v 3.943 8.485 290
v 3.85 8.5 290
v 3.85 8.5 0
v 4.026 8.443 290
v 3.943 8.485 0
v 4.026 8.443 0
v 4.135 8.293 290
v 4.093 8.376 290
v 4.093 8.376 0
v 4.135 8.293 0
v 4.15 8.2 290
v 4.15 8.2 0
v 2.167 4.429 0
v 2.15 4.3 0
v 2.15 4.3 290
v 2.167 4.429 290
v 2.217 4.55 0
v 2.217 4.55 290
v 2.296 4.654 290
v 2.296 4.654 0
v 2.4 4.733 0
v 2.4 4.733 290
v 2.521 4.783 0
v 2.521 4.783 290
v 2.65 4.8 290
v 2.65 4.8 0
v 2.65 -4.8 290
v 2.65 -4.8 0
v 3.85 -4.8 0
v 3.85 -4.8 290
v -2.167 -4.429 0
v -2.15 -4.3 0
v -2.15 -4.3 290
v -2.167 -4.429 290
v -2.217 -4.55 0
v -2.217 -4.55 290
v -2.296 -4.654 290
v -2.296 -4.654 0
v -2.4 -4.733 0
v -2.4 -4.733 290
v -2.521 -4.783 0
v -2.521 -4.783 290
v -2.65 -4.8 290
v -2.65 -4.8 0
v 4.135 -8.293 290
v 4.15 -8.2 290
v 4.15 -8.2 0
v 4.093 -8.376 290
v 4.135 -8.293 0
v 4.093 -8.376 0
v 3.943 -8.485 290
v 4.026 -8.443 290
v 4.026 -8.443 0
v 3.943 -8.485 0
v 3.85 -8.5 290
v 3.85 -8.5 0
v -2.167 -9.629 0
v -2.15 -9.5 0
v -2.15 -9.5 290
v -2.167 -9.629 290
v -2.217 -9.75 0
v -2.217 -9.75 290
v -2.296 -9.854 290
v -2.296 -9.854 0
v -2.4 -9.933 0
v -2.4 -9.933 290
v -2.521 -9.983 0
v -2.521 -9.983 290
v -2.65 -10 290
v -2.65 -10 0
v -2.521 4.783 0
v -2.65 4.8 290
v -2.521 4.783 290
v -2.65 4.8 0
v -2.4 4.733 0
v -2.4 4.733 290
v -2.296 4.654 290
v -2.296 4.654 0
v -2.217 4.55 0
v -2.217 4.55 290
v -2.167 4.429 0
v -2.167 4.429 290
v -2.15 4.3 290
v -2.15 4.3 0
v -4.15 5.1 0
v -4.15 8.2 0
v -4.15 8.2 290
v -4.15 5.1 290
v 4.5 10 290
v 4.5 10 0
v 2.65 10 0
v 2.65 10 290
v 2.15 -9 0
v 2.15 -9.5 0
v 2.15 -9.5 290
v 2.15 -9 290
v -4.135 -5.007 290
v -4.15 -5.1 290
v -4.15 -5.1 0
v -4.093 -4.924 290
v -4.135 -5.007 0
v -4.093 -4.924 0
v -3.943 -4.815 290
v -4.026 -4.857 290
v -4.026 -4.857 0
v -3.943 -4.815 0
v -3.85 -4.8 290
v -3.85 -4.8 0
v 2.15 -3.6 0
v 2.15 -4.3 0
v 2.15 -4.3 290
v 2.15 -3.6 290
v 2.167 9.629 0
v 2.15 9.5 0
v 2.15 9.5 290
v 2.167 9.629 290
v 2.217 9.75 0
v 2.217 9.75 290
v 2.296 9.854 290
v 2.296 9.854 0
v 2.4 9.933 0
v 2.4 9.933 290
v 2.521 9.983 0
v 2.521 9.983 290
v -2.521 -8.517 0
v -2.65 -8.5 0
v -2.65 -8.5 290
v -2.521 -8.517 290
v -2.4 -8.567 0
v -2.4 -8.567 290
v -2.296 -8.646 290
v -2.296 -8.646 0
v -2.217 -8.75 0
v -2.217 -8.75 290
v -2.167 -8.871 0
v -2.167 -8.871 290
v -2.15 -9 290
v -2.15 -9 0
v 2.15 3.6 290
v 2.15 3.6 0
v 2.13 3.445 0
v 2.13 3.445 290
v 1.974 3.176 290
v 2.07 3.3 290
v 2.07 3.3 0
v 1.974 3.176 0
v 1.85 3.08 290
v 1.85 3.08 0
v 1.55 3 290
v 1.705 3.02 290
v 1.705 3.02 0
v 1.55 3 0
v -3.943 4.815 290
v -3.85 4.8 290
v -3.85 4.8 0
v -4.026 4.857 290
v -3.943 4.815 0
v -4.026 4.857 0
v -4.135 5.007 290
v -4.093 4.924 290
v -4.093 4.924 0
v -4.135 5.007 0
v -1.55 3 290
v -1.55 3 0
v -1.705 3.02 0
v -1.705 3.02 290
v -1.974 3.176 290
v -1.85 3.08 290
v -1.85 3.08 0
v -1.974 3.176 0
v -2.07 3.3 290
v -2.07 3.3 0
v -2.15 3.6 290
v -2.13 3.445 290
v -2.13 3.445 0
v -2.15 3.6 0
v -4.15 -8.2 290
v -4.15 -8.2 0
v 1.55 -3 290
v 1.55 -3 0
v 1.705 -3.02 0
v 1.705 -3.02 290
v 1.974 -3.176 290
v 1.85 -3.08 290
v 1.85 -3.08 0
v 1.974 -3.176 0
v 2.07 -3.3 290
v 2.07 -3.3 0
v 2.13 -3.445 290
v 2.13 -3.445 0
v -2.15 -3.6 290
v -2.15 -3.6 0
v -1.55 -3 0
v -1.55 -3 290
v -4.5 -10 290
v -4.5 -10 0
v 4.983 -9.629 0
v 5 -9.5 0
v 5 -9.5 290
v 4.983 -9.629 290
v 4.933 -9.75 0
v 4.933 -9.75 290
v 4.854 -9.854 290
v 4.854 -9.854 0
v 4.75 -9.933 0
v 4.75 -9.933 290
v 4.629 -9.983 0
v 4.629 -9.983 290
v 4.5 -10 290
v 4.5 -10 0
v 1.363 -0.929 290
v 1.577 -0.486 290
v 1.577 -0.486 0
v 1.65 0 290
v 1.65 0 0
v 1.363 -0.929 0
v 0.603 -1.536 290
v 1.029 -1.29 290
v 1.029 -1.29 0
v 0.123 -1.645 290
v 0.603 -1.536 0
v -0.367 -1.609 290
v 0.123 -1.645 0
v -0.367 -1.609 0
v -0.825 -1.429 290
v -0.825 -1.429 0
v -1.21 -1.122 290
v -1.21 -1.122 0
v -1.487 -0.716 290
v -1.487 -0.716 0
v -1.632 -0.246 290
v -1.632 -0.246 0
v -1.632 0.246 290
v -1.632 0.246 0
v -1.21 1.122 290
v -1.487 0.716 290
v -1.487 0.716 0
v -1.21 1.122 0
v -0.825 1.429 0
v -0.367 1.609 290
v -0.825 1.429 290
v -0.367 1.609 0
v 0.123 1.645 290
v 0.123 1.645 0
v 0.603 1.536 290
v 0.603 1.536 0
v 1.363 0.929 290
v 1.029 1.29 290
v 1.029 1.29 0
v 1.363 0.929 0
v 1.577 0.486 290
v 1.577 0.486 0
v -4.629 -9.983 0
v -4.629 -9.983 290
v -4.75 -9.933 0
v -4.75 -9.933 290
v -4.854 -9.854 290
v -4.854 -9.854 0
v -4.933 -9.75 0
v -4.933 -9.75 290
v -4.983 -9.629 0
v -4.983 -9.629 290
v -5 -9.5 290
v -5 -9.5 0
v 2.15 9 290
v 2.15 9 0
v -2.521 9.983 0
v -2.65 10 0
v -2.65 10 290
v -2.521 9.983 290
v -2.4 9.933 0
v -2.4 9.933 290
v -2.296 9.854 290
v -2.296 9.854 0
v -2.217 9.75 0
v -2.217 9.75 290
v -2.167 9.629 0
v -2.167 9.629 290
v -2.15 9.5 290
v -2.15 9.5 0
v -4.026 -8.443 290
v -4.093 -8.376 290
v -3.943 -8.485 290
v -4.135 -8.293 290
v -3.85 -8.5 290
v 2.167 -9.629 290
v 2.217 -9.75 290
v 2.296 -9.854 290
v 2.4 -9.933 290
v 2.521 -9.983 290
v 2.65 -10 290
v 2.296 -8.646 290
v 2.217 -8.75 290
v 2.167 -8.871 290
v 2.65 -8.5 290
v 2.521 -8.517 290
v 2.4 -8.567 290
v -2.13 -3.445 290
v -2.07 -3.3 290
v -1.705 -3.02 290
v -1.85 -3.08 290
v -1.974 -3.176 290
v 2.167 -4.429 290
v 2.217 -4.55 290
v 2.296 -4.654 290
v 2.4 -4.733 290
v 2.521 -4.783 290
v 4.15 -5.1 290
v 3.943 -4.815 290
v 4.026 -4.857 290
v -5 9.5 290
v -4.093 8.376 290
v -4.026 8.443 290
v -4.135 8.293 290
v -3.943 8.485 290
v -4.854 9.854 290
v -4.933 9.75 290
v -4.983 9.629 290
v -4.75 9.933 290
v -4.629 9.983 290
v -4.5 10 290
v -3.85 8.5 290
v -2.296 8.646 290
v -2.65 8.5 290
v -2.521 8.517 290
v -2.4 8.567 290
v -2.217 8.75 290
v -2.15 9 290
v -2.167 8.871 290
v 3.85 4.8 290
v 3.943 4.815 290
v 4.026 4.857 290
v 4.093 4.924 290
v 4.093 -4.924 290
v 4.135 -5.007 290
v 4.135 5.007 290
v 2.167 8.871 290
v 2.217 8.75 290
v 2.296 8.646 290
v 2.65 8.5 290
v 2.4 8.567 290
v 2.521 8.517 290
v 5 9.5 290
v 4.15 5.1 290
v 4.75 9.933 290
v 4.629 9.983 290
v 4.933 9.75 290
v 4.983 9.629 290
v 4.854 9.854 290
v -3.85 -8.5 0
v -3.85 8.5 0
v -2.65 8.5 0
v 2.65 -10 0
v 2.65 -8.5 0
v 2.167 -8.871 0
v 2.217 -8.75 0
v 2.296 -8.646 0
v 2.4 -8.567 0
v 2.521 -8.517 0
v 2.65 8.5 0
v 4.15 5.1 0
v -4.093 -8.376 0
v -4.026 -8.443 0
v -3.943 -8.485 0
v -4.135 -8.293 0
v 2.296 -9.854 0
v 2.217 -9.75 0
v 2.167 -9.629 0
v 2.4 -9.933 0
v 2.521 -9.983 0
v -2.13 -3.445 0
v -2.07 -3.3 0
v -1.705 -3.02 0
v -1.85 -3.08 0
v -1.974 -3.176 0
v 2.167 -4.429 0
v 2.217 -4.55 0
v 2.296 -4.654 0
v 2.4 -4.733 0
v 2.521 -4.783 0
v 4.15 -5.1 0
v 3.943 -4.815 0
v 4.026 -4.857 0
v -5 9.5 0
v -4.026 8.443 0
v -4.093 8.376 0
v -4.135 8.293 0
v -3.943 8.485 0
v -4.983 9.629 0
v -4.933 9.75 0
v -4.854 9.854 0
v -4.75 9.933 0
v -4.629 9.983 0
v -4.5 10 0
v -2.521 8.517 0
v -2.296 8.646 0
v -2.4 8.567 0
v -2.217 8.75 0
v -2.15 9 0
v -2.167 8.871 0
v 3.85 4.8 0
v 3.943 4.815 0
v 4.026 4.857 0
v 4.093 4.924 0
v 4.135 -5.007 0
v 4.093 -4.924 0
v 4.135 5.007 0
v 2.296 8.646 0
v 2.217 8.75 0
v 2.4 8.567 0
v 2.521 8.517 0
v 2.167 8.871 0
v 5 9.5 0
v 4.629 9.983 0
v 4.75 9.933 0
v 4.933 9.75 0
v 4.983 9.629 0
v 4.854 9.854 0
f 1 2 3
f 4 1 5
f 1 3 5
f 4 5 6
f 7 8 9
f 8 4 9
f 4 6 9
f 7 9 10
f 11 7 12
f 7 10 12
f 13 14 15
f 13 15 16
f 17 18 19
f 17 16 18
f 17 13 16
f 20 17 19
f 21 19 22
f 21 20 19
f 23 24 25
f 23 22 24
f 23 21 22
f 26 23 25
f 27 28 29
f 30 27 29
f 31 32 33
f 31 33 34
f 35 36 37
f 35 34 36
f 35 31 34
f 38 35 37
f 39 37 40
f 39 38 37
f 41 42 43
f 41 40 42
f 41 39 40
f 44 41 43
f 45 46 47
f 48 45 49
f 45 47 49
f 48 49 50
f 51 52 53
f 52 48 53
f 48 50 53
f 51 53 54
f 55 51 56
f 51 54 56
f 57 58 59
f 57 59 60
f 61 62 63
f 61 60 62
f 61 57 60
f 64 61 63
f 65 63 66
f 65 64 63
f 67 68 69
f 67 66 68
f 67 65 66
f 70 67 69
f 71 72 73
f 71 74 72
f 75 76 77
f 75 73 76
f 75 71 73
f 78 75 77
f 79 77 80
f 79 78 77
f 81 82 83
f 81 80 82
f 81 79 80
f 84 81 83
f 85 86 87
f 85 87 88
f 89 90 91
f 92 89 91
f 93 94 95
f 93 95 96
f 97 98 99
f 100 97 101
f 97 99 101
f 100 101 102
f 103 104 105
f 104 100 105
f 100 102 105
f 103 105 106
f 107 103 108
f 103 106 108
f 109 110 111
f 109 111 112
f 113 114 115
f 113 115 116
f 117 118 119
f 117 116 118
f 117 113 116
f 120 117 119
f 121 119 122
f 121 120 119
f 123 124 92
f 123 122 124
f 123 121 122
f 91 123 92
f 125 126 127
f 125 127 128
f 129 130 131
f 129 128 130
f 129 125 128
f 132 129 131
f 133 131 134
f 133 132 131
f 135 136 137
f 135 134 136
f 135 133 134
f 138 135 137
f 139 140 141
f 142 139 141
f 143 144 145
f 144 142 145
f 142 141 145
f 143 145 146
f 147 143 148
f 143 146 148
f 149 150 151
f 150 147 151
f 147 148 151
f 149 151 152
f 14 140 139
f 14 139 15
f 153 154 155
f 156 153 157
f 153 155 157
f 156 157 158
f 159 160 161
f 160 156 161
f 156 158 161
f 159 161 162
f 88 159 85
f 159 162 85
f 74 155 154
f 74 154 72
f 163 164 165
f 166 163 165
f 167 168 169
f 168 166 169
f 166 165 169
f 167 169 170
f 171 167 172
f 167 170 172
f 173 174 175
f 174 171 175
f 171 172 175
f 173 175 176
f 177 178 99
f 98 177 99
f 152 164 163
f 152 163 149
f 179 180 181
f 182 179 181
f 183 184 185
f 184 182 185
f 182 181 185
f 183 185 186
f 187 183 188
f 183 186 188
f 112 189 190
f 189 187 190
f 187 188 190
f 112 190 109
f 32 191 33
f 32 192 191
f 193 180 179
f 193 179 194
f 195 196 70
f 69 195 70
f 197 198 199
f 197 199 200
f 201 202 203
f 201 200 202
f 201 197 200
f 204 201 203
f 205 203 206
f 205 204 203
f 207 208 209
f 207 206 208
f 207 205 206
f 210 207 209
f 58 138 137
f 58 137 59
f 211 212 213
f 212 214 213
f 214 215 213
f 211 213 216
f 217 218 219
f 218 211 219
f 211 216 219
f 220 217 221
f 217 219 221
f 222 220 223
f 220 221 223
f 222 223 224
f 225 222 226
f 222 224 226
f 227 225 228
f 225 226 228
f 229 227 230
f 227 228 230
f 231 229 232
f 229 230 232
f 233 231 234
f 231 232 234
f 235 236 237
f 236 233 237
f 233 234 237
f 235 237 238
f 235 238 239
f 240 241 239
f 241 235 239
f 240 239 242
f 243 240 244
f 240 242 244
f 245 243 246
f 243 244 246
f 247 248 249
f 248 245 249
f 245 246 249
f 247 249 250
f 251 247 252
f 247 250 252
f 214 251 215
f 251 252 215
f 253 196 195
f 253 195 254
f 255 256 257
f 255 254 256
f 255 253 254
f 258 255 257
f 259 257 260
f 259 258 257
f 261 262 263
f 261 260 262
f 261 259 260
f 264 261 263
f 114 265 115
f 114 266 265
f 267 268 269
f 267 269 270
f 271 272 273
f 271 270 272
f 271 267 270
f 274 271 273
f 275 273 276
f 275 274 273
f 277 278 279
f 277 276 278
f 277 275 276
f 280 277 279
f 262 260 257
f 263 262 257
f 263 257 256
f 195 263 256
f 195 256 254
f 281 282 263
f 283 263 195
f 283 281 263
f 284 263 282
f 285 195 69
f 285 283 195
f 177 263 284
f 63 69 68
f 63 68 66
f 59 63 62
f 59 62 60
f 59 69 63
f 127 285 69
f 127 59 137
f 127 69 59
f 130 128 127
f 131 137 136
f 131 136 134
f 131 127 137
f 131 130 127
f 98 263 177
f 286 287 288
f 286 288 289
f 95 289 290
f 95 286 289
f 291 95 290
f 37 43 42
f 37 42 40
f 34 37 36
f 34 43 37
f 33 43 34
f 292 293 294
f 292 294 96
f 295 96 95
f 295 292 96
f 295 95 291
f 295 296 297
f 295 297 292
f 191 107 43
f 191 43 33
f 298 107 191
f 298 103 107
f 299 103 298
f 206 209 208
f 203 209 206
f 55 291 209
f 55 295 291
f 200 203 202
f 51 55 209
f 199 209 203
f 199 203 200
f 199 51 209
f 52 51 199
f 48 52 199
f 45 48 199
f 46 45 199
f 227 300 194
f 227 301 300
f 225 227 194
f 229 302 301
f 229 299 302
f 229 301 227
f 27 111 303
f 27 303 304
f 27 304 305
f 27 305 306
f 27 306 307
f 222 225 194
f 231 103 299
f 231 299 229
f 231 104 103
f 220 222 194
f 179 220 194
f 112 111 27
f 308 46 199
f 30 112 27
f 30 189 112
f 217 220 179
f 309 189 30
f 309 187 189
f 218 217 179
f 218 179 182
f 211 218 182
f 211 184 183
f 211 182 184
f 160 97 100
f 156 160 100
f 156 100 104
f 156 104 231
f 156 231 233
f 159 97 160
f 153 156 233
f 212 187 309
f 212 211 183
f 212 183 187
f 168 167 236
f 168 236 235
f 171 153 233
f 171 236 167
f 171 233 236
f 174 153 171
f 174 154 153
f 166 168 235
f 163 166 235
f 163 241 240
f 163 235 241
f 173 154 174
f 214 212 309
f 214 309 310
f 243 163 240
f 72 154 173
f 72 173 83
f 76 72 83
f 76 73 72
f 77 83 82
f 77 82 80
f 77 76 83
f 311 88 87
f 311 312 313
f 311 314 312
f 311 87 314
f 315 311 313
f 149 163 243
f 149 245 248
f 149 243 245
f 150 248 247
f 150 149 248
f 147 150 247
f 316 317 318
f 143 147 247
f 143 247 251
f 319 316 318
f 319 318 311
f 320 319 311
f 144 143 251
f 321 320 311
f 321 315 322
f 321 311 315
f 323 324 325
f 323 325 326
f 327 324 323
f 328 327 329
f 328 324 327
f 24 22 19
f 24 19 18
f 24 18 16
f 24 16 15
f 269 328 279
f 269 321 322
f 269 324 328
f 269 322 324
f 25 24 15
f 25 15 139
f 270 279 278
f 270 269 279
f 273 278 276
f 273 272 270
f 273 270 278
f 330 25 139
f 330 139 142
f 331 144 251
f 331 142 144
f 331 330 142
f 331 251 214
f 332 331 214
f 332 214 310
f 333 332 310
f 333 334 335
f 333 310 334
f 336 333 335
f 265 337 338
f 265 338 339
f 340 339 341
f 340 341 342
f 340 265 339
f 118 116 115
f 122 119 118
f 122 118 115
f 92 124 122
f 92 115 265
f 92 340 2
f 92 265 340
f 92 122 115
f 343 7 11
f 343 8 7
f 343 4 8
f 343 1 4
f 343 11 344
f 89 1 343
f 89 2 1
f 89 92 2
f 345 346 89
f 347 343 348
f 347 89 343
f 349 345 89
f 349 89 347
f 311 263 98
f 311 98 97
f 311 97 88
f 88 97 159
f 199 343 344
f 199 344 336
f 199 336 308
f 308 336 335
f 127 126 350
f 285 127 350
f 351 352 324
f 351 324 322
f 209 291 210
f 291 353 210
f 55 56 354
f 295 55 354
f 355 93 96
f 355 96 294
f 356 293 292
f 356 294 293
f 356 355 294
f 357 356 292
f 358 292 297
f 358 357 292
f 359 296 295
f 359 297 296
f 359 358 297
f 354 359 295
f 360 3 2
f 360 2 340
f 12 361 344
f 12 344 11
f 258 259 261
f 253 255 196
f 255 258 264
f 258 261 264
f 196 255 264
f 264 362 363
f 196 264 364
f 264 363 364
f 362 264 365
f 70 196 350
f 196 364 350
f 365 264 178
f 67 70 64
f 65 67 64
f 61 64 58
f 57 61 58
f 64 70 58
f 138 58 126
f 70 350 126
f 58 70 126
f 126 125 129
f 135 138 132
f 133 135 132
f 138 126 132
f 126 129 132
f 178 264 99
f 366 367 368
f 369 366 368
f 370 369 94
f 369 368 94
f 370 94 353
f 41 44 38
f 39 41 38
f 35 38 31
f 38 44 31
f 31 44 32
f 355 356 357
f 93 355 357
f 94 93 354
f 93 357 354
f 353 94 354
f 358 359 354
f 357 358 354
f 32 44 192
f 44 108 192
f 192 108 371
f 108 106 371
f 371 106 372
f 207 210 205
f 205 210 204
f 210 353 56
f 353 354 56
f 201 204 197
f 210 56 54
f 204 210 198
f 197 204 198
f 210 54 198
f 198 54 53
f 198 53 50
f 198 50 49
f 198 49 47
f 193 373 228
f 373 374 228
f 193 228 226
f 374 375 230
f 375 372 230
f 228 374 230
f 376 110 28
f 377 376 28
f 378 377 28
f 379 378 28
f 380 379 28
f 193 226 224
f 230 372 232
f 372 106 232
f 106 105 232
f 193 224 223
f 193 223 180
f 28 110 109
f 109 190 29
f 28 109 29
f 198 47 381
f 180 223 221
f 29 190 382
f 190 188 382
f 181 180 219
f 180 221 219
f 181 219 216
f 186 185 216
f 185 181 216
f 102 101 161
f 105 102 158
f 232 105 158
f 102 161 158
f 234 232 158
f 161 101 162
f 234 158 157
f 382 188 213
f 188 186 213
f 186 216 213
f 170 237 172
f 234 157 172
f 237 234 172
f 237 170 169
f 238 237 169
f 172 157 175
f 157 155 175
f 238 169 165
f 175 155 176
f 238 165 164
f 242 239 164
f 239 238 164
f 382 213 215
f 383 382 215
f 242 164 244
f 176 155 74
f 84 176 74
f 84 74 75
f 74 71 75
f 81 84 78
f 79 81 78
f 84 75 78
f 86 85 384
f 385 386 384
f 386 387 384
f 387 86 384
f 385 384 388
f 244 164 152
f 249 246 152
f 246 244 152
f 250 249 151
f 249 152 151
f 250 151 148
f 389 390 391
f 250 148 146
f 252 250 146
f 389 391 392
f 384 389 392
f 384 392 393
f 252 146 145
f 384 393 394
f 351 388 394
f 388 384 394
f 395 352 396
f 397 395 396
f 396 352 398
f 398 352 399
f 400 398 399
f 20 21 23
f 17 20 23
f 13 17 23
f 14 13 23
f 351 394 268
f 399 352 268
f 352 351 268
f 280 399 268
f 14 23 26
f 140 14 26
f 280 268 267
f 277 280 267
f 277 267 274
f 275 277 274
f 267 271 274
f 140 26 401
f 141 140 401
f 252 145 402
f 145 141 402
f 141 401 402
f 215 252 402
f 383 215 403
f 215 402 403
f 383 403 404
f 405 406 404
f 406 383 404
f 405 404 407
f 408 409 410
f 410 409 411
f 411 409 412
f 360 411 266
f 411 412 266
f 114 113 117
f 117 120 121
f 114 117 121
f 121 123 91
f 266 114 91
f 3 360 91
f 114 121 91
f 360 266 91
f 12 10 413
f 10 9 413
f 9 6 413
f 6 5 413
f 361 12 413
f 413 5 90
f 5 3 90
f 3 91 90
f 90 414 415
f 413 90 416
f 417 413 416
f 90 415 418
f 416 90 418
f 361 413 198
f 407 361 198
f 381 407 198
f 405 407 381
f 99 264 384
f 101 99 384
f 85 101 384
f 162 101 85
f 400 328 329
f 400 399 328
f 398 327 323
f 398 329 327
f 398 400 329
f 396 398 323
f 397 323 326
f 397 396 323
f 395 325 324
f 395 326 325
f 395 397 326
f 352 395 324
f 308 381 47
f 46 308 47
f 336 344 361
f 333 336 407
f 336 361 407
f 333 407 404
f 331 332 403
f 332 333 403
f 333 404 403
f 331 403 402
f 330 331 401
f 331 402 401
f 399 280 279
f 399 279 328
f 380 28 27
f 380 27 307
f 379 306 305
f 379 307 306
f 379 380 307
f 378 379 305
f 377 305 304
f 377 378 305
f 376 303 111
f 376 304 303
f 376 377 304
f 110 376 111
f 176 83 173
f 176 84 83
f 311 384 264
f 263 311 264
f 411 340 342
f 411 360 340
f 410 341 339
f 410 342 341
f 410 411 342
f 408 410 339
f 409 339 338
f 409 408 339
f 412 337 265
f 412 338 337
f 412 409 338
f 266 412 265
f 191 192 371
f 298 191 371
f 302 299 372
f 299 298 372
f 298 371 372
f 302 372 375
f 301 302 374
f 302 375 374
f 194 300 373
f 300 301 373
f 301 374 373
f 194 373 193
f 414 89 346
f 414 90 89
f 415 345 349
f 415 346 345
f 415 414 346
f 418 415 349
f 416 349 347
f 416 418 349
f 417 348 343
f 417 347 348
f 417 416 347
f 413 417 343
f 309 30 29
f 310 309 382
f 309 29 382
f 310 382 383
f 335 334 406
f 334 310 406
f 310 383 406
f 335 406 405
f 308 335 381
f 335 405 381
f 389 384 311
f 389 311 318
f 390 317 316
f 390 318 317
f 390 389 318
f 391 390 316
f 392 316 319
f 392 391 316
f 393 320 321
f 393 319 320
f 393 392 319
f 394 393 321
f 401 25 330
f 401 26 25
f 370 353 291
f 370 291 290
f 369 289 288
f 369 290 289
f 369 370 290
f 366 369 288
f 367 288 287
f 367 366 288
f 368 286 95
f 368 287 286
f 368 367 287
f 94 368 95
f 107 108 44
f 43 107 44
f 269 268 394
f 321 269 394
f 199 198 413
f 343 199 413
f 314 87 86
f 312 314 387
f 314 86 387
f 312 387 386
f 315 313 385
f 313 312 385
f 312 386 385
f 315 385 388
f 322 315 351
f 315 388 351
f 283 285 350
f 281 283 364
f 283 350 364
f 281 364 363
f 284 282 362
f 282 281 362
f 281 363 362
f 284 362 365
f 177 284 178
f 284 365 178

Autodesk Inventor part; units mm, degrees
ref_plane "YZ Plane" through (0, 0, 0) normal (1, 0, 0) x (0, 1, 0)
ref_plane "XZ Plane" through (0, 0, 0) normal (0, 1, 0) x (-1, 0, 0)
ref_plane "XY Plane" through (0, 0, 0) normal (0, 0, 1) x (1, 0, 0)
sketch "BaseI" plane through (0, 0, 0) normal (0, 0, 1) x (1, 0, 0)
  line L0 (-4.5, -10) -> (-2.65, -10)
  line L1 (5, -9.5) -> (5, 9.5)
  line L2 (4.5, 10) -> (2.65, 10)
  line L3 (-5, 9.5) -> (-5, -9.5)
  line L4 (-5, -10) -> (5, 10) construction
  line L5 (5, -10) -> (-5, 10) construction
  line L6 (3.85, 8.5) -> (2.65, 8.5)
  line L7 (-4.15, 8.2) -> (-4.15, 5.1)
  line L8 (-3.85, 4.8) -> (-2.65, 4.8)
  line L9 (4.15, 5.1) -> (4.15, 8.2)
  line L10 (4.15, 8.5) -> (-4.15, 4.8) construction
  line L11 (-4.15, 8.5) -> (4.15, 4.8) construction
  line L12 (-1.55, 3) -> (1.55, 3)
  line L13 (2.15, 3.6) -> (2.15, 4.3)
  line L14 (-2.15, 9.5) -> (-2.15, 9)
  line L15 (-2.15, 3) -> (2.15, 10) construction
  line L16 (2.15, 3) -> (-2.15, 10) construction
  line L17 (3.85, -8.5) -> (2.65, -8.5)
  line L18 (-4.15, -8.2) -> (-4.15, -5.1)
  line L19 (-3.85, -4.8) -> (-2.65, -4.8)
  line L20 (4.15, -5.1) -> (4.15, -8.2)
  line L21 (4.15, -8.5) -> (-4.15, -4.8) construction
  line L22 (-4.15, -8.5) -> (4.15, -4.8) construction
  line L23 (1.55, -3) -> (-1.55, -3)
  line L24 (-2.15, -3.6) -> (-2.15, -4.3)
  line L25 (2.15, -9.5) -> (2.15, -9)
  line L26 (2.15, -3) -> (-2.15, -10) construction
  line L27 (-2.15, -3) -> (2.15, -10) construction
  arc A0 (-4.5, 10) -> (-5, 9.5) centre (-4.5, 9.5) ccw
  arc A1 (5, 9.5) -> (4.5, 10) centre (4.5, 9.5) ccw
  arc A2 (4.5, -10) -> (5, -9.5) centre (4.5, -9.5) ccw
  arc A3 (-5, -9.5) -> (-4.5, -10) centre (-4.5, -9.5) ccw
  line L28 (-2.65, 10) -> (-4.5, 10)
  line L29 (2.65, -10) -> (4.5, -10)
  arc A4 (-3.85, 8.5) -> (-4.15, 8.2) centre (-3.85, 8.2) ccw
  arc A5 (-4.15, 5.1) -> (-3.85, 4.8) centre (-3.85, 5.1) ccw
  arc A6 (4.15, 8.2) -> (3.85, 8.5) centre (3.85, 8.2) ccw
  arc A7 (3.85, 4.8) -> (4.15, 5.1) centre (3.85, 5.1) ccw
  arc A8 (-3.85, -4.8) -> (-4.15, -5.1) centre (-3.85, -5.1) ccw
  arc A9 (-4.15, -8.2) -> (-3.85, -8.5) centre (-3.85, -8.2) ccw
  arc A10 (4.15, -5.1) -> (3.85, -4.8) centre (3.85, -5.1) ccw
  arc A11 (3.85, -8.5) -> (4.15, -8.2) centre (3.85, -8.2) ccw
  arc A12 (-2.15, 3.6) -> (-1.55, 3) centre (-1.55, 3.6) ccw
  arc A13 (1.55, 3) -> (2.15, 3.6) centre (1.55, 3.6) ccw
  arc A14 (-1.55, -3) -> (-2.15, -3.6) centre (-1.55, -3.6) ccw
  arc A15 (2.15, -3.6) -> (1.55, -3) centre (1.55, -3.6) ccw
  arc A16 (-2.15, 9.5) -> (-2.65, 10) centre (-2.65, 9.5) ccw
  arc A17 (2.65, 10) -> (2.15, 9.5) centre (2.65, 9.5) ccw
  line L30 (-2.65, 8.5) -> (-3.85, 8.5)
  line L31 (2.65, 4.8) -> (3.85, 4.8)
  line L32 (2.15, 9) -> (2.15, 9.5)
  line L33 (-2.15, 4.3) -> (-2.15, 3.6)
  line L34 (2.15, -4.3) -> (2.15, -3.6)
  line L35 (-2.15, -9) -> (-2.15, -9.5)
  line L36 (2.65, -4.8) -> (3.85, -4.8)
  line L37 (-2.65, -8.5) -> (-3.85, -8.5)
  arc A18 (-2.15, 4.3) -> (-2.65, 4.8) centre (-2.65, 4.3) ccw
  arc A19 (2.65, 4.8) -> (2.15, 4.3) centre (2.65, 4.3) ccw
  arc A20 (2.15, 9) -> (2.65, 8.5) centre (2.65, 9) ccw
  arc A21 (-2.65, 8.5) -> (-2.15, 9) centre (-2.65, 9) ccw
  arc A22 (-2.65, -4.8) -> (-2.15, -4.3) centre (-2.65, -4.3) ccw
  arc A23 (2.15, -4.3) -> (2.65, -4.8) centre (2.65, -4.3) ccw
  arc A24 (2.65, -8.5) -> (2.15, -9) centre (2.65, -9) ccw
  arc A25 (-2.15, -9) -> (-2.65, -8.5) centre (-2.65, -9) ccw
  arc A26 (-2.65, -10) -> (-2.15, -9.5) centre (-2.65, -9.5) ccw
  arc A27 (2.15, -9.5) -> (2.65, -10) centre (2.65, -9.5) ccw
  circle A28 centre (0, 0) radius 1.65
  point P0 (0, 6.65)
  point P1 (0, 6.5)
  point P2 (0, -6.65)
  point P3 (0, -6.5)
  point P4 (0, 6.5)
  point P5 (0, 10)
  point P6 (0, -6.5)
  point P7 (0, -10)
  point P8 (0, 6.65)
  point P9 (0, 10)
  point P10 (0, 6.65)
  point P11 (0, -6.65)
  point P12 (0, -10)
  point P13 (0, -6.5)
  point P14 (0, -6.65)
  point P15 (0, 6.5)
  dimension "d0" = 10
  dimension "d1" = 20
  dimension "d2" = 7
  dimension "d3" = 4.3
  dimension "d4" = 7
  dimension "d5" = 4.3
  dimension "d6" = 8.3
  dimension "d7" = 8.3
  dimension "d8" = 3.7
  dimension "d9" = 3.7
  dimension "d10" = 1.5
  dimension "d11" = 1.5
  dimension "d12" = 0.5
  dimension "d13" = 0.3
  dimension "d14" = 0.6
  dimension "d15" = 0.5
  dimension "d16" = 0.5
  dimension "d17" = 3.3
extrude "押し出し1" add sketch "BaseI" along normal blind 290
properties part number "I330" material "アルミニウム 6061"
